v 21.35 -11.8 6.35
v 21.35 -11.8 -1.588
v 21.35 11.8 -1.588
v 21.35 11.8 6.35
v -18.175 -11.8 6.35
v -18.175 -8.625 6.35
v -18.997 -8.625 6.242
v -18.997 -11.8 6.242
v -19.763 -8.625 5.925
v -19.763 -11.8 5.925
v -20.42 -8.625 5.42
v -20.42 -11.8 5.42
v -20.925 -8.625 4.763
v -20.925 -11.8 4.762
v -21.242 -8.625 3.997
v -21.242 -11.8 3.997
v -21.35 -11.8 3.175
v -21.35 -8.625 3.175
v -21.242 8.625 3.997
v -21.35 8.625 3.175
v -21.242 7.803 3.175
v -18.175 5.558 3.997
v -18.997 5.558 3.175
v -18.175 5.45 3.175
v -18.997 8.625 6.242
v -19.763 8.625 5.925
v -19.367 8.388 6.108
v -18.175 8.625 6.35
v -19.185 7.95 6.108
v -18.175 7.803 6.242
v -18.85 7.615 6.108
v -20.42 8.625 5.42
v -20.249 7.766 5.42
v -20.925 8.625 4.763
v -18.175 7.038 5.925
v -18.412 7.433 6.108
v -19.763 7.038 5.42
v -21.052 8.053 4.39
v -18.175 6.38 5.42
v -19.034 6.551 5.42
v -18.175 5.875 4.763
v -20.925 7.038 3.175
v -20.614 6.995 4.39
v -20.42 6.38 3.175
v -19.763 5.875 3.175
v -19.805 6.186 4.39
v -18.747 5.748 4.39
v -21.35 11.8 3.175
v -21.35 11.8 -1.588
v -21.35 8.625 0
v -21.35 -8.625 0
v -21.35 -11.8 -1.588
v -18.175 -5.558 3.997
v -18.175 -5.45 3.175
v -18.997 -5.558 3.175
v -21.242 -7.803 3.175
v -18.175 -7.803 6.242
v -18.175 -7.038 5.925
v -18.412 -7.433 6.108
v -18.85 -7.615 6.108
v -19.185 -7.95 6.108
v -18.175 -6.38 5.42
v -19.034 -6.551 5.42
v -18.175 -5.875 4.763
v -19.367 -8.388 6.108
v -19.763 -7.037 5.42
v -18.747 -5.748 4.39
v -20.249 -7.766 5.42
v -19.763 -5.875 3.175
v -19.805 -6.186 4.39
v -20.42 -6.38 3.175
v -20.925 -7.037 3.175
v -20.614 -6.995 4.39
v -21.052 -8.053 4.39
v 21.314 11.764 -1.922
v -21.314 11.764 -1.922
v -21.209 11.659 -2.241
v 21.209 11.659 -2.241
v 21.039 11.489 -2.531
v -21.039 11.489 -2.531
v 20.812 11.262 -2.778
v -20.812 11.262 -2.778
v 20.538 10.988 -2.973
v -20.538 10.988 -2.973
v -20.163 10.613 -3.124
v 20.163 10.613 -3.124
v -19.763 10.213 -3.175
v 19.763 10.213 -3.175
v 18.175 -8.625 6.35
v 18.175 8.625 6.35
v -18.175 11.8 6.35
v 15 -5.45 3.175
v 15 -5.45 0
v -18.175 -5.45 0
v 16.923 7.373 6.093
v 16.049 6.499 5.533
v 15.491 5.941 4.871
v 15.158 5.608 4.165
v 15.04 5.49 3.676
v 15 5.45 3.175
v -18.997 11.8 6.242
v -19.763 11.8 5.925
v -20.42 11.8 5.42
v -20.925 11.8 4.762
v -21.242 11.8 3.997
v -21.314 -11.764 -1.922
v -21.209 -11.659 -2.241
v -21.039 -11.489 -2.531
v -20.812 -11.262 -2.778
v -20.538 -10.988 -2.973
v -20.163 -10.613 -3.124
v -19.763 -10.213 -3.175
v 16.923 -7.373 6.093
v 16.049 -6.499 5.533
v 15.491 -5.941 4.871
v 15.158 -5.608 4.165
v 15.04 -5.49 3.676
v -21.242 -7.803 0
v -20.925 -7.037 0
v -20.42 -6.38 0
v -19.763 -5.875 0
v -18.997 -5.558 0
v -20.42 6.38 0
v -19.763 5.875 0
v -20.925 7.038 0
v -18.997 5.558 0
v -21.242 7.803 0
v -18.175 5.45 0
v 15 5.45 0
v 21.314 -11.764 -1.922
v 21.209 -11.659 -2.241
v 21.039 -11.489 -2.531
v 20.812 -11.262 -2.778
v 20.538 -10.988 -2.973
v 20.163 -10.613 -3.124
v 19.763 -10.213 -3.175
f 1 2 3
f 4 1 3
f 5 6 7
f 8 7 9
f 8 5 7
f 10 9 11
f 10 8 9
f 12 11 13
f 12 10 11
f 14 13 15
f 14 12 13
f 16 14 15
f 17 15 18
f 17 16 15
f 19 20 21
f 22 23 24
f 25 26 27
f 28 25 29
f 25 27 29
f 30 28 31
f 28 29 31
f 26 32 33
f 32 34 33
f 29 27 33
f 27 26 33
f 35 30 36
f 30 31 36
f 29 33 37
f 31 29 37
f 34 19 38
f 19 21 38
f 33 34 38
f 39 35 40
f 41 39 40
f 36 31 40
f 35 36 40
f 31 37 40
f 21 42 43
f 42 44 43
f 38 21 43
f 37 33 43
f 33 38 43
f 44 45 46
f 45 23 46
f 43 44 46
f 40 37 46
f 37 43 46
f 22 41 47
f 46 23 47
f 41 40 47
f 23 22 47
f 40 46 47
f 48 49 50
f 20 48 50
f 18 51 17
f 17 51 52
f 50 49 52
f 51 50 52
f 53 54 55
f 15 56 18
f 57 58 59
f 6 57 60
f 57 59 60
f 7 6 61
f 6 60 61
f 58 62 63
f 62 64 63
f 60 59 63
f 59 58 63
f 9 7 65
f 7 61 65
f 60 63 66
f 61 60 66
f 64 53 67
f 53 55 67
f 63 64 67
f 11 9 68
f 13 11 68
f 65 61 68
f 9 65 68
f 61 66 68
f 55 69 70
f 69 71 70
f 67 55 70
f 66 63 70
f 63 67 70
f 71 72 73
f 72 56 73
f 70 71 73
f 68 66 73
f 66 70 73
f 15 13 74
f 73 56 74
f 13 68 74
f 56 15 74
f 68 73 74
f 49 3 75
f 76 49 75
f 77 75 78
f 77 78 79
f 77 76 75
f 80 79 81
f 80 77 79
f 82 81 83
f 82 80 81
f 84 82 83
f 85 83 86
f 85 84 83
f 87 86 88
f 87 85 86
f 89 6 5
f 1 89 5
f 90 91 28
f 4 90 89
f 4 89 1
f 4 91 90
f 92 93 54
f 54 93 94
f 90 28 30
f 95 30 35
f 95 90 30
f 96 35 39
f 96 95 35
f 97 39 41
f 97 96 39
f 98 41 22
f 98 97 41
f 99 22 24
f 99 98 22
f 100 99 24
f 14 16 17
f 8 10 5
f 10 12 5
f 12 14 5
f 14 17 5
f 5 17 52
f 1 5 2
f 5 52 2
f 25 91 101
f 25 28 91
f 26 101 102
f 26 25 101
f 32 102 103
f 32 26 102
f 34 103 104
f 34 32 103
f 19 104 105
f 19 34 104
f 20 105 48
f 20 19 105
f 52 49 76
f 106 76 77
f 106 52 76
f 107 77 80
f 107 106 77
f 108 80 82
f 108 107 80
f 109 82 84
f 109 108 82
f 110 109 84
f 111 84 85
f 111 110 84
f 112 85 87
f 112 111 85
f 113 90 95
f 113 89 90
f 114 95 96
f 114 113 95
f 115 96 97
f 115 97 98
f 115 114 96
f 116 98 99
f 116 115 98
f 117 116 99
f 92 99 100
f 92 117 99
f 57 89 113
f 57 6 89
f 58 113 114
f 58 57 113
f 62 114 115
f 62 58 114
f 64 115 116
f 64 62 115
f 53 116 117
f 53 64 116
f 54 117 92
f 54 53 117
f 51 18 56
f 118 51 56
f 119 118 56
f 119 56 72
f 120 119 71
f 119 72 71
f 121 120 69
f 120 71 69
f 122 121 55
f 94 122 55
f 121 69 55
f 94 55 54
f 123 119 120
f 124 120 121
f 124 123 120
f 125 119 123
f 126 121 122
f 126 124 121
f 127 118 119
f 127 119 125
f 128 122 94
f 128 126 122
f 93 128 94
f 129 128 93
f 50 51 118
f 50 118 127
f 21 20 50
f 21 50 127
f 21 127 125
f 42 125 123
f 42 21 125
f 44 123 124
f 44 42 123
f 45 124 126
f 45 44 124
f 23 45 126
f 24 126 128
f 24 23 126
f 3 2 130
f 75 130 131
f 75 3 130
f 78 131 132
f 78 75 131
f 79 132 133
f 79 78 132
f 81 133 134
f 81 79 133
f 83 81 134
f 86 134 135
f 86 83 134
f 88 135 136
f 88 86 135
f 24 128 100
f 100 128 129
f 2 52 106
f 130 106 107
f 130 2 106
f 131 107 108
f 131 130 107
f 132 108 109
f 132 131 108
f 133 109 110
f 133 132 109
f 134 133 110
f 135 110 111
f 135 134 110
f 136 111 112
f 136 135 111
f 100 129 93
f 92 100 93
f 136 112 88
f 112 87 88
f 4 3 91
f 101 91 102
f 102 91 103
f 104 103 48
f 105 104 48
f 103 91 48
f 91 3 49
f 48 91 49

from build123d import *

# Parameters (mm, degrees)
F0_W     = 30
F0_H     = 10.9
F0_W_2   = 6.35
F1_DEPTH = 3.175
F2_DEPTH = 6.35
F3_R     = 3.175
F4_R     = 3.175
F5_R     = 1.5875


with BuildPart() as f1:
    # F0 (on Top) → F1 (new body)
    with BuildSketch(Plane.XY):
        Polygon((-15, 5.45), (15, 5.45), (15, -5.45), (-15, -5.45), (-21.35, -5.45), (-21.35, -11.8), (21.35, -11.8), (21.35, 11.8), (-21.35, 11.8), (-21.35, 5.45), align=None)
        Rectangle(F0_W, F0_H)
        with Locations((-18.175, 0)):
            Rectangle(F0_W_2, F0_H)
    extrude(amount=-F1_DEPTH)

    # F0 (on Top) → F2 (join)
    with BuildSketch(Plane.XY):
        Polygon((-15, 5.45), (15, 5.45), (15, -5.45), (-15, -5.45), (-21.35, -5.45), (-21.35, -11.8), (21.35, -11.8), (21.35, 11.8), (-21.35, 11.8), (-21.35, 5.45), align=None)
    extrude(amount=F2_DEPTH)

    # F3
    f3_edges = [f1.edges().sort_by_distance(p)[0] for p in [
        (-21.35, 5.45, 3.175),
        (-21.35, -5.45, 3.175),
    ]]
    fillet(f3_edges, radius=F3_R)

    # F4
    f4_edges = [f1.edges().sort_by_distance(p)[0] for p in [
        (-1.5875, 5.45, 6.35),
        (-1.5875, -5.45, 6.35),
        (15, 0, 6.35),
    ]]
    fillet(f4_edges, radius=F4_R)

    # F5
    f5_edges = [f1.edges().sort_by_distance(p)[0] for p in [
        (0, -11.8, -3.175),
        (21.35, 0, -3.175),
        (0, 11.8, -3.175),
        (-21.35, 0, -3.175),
    ]]
    fillet(f5_edges, radius=F5_R)


solid = f1.part
